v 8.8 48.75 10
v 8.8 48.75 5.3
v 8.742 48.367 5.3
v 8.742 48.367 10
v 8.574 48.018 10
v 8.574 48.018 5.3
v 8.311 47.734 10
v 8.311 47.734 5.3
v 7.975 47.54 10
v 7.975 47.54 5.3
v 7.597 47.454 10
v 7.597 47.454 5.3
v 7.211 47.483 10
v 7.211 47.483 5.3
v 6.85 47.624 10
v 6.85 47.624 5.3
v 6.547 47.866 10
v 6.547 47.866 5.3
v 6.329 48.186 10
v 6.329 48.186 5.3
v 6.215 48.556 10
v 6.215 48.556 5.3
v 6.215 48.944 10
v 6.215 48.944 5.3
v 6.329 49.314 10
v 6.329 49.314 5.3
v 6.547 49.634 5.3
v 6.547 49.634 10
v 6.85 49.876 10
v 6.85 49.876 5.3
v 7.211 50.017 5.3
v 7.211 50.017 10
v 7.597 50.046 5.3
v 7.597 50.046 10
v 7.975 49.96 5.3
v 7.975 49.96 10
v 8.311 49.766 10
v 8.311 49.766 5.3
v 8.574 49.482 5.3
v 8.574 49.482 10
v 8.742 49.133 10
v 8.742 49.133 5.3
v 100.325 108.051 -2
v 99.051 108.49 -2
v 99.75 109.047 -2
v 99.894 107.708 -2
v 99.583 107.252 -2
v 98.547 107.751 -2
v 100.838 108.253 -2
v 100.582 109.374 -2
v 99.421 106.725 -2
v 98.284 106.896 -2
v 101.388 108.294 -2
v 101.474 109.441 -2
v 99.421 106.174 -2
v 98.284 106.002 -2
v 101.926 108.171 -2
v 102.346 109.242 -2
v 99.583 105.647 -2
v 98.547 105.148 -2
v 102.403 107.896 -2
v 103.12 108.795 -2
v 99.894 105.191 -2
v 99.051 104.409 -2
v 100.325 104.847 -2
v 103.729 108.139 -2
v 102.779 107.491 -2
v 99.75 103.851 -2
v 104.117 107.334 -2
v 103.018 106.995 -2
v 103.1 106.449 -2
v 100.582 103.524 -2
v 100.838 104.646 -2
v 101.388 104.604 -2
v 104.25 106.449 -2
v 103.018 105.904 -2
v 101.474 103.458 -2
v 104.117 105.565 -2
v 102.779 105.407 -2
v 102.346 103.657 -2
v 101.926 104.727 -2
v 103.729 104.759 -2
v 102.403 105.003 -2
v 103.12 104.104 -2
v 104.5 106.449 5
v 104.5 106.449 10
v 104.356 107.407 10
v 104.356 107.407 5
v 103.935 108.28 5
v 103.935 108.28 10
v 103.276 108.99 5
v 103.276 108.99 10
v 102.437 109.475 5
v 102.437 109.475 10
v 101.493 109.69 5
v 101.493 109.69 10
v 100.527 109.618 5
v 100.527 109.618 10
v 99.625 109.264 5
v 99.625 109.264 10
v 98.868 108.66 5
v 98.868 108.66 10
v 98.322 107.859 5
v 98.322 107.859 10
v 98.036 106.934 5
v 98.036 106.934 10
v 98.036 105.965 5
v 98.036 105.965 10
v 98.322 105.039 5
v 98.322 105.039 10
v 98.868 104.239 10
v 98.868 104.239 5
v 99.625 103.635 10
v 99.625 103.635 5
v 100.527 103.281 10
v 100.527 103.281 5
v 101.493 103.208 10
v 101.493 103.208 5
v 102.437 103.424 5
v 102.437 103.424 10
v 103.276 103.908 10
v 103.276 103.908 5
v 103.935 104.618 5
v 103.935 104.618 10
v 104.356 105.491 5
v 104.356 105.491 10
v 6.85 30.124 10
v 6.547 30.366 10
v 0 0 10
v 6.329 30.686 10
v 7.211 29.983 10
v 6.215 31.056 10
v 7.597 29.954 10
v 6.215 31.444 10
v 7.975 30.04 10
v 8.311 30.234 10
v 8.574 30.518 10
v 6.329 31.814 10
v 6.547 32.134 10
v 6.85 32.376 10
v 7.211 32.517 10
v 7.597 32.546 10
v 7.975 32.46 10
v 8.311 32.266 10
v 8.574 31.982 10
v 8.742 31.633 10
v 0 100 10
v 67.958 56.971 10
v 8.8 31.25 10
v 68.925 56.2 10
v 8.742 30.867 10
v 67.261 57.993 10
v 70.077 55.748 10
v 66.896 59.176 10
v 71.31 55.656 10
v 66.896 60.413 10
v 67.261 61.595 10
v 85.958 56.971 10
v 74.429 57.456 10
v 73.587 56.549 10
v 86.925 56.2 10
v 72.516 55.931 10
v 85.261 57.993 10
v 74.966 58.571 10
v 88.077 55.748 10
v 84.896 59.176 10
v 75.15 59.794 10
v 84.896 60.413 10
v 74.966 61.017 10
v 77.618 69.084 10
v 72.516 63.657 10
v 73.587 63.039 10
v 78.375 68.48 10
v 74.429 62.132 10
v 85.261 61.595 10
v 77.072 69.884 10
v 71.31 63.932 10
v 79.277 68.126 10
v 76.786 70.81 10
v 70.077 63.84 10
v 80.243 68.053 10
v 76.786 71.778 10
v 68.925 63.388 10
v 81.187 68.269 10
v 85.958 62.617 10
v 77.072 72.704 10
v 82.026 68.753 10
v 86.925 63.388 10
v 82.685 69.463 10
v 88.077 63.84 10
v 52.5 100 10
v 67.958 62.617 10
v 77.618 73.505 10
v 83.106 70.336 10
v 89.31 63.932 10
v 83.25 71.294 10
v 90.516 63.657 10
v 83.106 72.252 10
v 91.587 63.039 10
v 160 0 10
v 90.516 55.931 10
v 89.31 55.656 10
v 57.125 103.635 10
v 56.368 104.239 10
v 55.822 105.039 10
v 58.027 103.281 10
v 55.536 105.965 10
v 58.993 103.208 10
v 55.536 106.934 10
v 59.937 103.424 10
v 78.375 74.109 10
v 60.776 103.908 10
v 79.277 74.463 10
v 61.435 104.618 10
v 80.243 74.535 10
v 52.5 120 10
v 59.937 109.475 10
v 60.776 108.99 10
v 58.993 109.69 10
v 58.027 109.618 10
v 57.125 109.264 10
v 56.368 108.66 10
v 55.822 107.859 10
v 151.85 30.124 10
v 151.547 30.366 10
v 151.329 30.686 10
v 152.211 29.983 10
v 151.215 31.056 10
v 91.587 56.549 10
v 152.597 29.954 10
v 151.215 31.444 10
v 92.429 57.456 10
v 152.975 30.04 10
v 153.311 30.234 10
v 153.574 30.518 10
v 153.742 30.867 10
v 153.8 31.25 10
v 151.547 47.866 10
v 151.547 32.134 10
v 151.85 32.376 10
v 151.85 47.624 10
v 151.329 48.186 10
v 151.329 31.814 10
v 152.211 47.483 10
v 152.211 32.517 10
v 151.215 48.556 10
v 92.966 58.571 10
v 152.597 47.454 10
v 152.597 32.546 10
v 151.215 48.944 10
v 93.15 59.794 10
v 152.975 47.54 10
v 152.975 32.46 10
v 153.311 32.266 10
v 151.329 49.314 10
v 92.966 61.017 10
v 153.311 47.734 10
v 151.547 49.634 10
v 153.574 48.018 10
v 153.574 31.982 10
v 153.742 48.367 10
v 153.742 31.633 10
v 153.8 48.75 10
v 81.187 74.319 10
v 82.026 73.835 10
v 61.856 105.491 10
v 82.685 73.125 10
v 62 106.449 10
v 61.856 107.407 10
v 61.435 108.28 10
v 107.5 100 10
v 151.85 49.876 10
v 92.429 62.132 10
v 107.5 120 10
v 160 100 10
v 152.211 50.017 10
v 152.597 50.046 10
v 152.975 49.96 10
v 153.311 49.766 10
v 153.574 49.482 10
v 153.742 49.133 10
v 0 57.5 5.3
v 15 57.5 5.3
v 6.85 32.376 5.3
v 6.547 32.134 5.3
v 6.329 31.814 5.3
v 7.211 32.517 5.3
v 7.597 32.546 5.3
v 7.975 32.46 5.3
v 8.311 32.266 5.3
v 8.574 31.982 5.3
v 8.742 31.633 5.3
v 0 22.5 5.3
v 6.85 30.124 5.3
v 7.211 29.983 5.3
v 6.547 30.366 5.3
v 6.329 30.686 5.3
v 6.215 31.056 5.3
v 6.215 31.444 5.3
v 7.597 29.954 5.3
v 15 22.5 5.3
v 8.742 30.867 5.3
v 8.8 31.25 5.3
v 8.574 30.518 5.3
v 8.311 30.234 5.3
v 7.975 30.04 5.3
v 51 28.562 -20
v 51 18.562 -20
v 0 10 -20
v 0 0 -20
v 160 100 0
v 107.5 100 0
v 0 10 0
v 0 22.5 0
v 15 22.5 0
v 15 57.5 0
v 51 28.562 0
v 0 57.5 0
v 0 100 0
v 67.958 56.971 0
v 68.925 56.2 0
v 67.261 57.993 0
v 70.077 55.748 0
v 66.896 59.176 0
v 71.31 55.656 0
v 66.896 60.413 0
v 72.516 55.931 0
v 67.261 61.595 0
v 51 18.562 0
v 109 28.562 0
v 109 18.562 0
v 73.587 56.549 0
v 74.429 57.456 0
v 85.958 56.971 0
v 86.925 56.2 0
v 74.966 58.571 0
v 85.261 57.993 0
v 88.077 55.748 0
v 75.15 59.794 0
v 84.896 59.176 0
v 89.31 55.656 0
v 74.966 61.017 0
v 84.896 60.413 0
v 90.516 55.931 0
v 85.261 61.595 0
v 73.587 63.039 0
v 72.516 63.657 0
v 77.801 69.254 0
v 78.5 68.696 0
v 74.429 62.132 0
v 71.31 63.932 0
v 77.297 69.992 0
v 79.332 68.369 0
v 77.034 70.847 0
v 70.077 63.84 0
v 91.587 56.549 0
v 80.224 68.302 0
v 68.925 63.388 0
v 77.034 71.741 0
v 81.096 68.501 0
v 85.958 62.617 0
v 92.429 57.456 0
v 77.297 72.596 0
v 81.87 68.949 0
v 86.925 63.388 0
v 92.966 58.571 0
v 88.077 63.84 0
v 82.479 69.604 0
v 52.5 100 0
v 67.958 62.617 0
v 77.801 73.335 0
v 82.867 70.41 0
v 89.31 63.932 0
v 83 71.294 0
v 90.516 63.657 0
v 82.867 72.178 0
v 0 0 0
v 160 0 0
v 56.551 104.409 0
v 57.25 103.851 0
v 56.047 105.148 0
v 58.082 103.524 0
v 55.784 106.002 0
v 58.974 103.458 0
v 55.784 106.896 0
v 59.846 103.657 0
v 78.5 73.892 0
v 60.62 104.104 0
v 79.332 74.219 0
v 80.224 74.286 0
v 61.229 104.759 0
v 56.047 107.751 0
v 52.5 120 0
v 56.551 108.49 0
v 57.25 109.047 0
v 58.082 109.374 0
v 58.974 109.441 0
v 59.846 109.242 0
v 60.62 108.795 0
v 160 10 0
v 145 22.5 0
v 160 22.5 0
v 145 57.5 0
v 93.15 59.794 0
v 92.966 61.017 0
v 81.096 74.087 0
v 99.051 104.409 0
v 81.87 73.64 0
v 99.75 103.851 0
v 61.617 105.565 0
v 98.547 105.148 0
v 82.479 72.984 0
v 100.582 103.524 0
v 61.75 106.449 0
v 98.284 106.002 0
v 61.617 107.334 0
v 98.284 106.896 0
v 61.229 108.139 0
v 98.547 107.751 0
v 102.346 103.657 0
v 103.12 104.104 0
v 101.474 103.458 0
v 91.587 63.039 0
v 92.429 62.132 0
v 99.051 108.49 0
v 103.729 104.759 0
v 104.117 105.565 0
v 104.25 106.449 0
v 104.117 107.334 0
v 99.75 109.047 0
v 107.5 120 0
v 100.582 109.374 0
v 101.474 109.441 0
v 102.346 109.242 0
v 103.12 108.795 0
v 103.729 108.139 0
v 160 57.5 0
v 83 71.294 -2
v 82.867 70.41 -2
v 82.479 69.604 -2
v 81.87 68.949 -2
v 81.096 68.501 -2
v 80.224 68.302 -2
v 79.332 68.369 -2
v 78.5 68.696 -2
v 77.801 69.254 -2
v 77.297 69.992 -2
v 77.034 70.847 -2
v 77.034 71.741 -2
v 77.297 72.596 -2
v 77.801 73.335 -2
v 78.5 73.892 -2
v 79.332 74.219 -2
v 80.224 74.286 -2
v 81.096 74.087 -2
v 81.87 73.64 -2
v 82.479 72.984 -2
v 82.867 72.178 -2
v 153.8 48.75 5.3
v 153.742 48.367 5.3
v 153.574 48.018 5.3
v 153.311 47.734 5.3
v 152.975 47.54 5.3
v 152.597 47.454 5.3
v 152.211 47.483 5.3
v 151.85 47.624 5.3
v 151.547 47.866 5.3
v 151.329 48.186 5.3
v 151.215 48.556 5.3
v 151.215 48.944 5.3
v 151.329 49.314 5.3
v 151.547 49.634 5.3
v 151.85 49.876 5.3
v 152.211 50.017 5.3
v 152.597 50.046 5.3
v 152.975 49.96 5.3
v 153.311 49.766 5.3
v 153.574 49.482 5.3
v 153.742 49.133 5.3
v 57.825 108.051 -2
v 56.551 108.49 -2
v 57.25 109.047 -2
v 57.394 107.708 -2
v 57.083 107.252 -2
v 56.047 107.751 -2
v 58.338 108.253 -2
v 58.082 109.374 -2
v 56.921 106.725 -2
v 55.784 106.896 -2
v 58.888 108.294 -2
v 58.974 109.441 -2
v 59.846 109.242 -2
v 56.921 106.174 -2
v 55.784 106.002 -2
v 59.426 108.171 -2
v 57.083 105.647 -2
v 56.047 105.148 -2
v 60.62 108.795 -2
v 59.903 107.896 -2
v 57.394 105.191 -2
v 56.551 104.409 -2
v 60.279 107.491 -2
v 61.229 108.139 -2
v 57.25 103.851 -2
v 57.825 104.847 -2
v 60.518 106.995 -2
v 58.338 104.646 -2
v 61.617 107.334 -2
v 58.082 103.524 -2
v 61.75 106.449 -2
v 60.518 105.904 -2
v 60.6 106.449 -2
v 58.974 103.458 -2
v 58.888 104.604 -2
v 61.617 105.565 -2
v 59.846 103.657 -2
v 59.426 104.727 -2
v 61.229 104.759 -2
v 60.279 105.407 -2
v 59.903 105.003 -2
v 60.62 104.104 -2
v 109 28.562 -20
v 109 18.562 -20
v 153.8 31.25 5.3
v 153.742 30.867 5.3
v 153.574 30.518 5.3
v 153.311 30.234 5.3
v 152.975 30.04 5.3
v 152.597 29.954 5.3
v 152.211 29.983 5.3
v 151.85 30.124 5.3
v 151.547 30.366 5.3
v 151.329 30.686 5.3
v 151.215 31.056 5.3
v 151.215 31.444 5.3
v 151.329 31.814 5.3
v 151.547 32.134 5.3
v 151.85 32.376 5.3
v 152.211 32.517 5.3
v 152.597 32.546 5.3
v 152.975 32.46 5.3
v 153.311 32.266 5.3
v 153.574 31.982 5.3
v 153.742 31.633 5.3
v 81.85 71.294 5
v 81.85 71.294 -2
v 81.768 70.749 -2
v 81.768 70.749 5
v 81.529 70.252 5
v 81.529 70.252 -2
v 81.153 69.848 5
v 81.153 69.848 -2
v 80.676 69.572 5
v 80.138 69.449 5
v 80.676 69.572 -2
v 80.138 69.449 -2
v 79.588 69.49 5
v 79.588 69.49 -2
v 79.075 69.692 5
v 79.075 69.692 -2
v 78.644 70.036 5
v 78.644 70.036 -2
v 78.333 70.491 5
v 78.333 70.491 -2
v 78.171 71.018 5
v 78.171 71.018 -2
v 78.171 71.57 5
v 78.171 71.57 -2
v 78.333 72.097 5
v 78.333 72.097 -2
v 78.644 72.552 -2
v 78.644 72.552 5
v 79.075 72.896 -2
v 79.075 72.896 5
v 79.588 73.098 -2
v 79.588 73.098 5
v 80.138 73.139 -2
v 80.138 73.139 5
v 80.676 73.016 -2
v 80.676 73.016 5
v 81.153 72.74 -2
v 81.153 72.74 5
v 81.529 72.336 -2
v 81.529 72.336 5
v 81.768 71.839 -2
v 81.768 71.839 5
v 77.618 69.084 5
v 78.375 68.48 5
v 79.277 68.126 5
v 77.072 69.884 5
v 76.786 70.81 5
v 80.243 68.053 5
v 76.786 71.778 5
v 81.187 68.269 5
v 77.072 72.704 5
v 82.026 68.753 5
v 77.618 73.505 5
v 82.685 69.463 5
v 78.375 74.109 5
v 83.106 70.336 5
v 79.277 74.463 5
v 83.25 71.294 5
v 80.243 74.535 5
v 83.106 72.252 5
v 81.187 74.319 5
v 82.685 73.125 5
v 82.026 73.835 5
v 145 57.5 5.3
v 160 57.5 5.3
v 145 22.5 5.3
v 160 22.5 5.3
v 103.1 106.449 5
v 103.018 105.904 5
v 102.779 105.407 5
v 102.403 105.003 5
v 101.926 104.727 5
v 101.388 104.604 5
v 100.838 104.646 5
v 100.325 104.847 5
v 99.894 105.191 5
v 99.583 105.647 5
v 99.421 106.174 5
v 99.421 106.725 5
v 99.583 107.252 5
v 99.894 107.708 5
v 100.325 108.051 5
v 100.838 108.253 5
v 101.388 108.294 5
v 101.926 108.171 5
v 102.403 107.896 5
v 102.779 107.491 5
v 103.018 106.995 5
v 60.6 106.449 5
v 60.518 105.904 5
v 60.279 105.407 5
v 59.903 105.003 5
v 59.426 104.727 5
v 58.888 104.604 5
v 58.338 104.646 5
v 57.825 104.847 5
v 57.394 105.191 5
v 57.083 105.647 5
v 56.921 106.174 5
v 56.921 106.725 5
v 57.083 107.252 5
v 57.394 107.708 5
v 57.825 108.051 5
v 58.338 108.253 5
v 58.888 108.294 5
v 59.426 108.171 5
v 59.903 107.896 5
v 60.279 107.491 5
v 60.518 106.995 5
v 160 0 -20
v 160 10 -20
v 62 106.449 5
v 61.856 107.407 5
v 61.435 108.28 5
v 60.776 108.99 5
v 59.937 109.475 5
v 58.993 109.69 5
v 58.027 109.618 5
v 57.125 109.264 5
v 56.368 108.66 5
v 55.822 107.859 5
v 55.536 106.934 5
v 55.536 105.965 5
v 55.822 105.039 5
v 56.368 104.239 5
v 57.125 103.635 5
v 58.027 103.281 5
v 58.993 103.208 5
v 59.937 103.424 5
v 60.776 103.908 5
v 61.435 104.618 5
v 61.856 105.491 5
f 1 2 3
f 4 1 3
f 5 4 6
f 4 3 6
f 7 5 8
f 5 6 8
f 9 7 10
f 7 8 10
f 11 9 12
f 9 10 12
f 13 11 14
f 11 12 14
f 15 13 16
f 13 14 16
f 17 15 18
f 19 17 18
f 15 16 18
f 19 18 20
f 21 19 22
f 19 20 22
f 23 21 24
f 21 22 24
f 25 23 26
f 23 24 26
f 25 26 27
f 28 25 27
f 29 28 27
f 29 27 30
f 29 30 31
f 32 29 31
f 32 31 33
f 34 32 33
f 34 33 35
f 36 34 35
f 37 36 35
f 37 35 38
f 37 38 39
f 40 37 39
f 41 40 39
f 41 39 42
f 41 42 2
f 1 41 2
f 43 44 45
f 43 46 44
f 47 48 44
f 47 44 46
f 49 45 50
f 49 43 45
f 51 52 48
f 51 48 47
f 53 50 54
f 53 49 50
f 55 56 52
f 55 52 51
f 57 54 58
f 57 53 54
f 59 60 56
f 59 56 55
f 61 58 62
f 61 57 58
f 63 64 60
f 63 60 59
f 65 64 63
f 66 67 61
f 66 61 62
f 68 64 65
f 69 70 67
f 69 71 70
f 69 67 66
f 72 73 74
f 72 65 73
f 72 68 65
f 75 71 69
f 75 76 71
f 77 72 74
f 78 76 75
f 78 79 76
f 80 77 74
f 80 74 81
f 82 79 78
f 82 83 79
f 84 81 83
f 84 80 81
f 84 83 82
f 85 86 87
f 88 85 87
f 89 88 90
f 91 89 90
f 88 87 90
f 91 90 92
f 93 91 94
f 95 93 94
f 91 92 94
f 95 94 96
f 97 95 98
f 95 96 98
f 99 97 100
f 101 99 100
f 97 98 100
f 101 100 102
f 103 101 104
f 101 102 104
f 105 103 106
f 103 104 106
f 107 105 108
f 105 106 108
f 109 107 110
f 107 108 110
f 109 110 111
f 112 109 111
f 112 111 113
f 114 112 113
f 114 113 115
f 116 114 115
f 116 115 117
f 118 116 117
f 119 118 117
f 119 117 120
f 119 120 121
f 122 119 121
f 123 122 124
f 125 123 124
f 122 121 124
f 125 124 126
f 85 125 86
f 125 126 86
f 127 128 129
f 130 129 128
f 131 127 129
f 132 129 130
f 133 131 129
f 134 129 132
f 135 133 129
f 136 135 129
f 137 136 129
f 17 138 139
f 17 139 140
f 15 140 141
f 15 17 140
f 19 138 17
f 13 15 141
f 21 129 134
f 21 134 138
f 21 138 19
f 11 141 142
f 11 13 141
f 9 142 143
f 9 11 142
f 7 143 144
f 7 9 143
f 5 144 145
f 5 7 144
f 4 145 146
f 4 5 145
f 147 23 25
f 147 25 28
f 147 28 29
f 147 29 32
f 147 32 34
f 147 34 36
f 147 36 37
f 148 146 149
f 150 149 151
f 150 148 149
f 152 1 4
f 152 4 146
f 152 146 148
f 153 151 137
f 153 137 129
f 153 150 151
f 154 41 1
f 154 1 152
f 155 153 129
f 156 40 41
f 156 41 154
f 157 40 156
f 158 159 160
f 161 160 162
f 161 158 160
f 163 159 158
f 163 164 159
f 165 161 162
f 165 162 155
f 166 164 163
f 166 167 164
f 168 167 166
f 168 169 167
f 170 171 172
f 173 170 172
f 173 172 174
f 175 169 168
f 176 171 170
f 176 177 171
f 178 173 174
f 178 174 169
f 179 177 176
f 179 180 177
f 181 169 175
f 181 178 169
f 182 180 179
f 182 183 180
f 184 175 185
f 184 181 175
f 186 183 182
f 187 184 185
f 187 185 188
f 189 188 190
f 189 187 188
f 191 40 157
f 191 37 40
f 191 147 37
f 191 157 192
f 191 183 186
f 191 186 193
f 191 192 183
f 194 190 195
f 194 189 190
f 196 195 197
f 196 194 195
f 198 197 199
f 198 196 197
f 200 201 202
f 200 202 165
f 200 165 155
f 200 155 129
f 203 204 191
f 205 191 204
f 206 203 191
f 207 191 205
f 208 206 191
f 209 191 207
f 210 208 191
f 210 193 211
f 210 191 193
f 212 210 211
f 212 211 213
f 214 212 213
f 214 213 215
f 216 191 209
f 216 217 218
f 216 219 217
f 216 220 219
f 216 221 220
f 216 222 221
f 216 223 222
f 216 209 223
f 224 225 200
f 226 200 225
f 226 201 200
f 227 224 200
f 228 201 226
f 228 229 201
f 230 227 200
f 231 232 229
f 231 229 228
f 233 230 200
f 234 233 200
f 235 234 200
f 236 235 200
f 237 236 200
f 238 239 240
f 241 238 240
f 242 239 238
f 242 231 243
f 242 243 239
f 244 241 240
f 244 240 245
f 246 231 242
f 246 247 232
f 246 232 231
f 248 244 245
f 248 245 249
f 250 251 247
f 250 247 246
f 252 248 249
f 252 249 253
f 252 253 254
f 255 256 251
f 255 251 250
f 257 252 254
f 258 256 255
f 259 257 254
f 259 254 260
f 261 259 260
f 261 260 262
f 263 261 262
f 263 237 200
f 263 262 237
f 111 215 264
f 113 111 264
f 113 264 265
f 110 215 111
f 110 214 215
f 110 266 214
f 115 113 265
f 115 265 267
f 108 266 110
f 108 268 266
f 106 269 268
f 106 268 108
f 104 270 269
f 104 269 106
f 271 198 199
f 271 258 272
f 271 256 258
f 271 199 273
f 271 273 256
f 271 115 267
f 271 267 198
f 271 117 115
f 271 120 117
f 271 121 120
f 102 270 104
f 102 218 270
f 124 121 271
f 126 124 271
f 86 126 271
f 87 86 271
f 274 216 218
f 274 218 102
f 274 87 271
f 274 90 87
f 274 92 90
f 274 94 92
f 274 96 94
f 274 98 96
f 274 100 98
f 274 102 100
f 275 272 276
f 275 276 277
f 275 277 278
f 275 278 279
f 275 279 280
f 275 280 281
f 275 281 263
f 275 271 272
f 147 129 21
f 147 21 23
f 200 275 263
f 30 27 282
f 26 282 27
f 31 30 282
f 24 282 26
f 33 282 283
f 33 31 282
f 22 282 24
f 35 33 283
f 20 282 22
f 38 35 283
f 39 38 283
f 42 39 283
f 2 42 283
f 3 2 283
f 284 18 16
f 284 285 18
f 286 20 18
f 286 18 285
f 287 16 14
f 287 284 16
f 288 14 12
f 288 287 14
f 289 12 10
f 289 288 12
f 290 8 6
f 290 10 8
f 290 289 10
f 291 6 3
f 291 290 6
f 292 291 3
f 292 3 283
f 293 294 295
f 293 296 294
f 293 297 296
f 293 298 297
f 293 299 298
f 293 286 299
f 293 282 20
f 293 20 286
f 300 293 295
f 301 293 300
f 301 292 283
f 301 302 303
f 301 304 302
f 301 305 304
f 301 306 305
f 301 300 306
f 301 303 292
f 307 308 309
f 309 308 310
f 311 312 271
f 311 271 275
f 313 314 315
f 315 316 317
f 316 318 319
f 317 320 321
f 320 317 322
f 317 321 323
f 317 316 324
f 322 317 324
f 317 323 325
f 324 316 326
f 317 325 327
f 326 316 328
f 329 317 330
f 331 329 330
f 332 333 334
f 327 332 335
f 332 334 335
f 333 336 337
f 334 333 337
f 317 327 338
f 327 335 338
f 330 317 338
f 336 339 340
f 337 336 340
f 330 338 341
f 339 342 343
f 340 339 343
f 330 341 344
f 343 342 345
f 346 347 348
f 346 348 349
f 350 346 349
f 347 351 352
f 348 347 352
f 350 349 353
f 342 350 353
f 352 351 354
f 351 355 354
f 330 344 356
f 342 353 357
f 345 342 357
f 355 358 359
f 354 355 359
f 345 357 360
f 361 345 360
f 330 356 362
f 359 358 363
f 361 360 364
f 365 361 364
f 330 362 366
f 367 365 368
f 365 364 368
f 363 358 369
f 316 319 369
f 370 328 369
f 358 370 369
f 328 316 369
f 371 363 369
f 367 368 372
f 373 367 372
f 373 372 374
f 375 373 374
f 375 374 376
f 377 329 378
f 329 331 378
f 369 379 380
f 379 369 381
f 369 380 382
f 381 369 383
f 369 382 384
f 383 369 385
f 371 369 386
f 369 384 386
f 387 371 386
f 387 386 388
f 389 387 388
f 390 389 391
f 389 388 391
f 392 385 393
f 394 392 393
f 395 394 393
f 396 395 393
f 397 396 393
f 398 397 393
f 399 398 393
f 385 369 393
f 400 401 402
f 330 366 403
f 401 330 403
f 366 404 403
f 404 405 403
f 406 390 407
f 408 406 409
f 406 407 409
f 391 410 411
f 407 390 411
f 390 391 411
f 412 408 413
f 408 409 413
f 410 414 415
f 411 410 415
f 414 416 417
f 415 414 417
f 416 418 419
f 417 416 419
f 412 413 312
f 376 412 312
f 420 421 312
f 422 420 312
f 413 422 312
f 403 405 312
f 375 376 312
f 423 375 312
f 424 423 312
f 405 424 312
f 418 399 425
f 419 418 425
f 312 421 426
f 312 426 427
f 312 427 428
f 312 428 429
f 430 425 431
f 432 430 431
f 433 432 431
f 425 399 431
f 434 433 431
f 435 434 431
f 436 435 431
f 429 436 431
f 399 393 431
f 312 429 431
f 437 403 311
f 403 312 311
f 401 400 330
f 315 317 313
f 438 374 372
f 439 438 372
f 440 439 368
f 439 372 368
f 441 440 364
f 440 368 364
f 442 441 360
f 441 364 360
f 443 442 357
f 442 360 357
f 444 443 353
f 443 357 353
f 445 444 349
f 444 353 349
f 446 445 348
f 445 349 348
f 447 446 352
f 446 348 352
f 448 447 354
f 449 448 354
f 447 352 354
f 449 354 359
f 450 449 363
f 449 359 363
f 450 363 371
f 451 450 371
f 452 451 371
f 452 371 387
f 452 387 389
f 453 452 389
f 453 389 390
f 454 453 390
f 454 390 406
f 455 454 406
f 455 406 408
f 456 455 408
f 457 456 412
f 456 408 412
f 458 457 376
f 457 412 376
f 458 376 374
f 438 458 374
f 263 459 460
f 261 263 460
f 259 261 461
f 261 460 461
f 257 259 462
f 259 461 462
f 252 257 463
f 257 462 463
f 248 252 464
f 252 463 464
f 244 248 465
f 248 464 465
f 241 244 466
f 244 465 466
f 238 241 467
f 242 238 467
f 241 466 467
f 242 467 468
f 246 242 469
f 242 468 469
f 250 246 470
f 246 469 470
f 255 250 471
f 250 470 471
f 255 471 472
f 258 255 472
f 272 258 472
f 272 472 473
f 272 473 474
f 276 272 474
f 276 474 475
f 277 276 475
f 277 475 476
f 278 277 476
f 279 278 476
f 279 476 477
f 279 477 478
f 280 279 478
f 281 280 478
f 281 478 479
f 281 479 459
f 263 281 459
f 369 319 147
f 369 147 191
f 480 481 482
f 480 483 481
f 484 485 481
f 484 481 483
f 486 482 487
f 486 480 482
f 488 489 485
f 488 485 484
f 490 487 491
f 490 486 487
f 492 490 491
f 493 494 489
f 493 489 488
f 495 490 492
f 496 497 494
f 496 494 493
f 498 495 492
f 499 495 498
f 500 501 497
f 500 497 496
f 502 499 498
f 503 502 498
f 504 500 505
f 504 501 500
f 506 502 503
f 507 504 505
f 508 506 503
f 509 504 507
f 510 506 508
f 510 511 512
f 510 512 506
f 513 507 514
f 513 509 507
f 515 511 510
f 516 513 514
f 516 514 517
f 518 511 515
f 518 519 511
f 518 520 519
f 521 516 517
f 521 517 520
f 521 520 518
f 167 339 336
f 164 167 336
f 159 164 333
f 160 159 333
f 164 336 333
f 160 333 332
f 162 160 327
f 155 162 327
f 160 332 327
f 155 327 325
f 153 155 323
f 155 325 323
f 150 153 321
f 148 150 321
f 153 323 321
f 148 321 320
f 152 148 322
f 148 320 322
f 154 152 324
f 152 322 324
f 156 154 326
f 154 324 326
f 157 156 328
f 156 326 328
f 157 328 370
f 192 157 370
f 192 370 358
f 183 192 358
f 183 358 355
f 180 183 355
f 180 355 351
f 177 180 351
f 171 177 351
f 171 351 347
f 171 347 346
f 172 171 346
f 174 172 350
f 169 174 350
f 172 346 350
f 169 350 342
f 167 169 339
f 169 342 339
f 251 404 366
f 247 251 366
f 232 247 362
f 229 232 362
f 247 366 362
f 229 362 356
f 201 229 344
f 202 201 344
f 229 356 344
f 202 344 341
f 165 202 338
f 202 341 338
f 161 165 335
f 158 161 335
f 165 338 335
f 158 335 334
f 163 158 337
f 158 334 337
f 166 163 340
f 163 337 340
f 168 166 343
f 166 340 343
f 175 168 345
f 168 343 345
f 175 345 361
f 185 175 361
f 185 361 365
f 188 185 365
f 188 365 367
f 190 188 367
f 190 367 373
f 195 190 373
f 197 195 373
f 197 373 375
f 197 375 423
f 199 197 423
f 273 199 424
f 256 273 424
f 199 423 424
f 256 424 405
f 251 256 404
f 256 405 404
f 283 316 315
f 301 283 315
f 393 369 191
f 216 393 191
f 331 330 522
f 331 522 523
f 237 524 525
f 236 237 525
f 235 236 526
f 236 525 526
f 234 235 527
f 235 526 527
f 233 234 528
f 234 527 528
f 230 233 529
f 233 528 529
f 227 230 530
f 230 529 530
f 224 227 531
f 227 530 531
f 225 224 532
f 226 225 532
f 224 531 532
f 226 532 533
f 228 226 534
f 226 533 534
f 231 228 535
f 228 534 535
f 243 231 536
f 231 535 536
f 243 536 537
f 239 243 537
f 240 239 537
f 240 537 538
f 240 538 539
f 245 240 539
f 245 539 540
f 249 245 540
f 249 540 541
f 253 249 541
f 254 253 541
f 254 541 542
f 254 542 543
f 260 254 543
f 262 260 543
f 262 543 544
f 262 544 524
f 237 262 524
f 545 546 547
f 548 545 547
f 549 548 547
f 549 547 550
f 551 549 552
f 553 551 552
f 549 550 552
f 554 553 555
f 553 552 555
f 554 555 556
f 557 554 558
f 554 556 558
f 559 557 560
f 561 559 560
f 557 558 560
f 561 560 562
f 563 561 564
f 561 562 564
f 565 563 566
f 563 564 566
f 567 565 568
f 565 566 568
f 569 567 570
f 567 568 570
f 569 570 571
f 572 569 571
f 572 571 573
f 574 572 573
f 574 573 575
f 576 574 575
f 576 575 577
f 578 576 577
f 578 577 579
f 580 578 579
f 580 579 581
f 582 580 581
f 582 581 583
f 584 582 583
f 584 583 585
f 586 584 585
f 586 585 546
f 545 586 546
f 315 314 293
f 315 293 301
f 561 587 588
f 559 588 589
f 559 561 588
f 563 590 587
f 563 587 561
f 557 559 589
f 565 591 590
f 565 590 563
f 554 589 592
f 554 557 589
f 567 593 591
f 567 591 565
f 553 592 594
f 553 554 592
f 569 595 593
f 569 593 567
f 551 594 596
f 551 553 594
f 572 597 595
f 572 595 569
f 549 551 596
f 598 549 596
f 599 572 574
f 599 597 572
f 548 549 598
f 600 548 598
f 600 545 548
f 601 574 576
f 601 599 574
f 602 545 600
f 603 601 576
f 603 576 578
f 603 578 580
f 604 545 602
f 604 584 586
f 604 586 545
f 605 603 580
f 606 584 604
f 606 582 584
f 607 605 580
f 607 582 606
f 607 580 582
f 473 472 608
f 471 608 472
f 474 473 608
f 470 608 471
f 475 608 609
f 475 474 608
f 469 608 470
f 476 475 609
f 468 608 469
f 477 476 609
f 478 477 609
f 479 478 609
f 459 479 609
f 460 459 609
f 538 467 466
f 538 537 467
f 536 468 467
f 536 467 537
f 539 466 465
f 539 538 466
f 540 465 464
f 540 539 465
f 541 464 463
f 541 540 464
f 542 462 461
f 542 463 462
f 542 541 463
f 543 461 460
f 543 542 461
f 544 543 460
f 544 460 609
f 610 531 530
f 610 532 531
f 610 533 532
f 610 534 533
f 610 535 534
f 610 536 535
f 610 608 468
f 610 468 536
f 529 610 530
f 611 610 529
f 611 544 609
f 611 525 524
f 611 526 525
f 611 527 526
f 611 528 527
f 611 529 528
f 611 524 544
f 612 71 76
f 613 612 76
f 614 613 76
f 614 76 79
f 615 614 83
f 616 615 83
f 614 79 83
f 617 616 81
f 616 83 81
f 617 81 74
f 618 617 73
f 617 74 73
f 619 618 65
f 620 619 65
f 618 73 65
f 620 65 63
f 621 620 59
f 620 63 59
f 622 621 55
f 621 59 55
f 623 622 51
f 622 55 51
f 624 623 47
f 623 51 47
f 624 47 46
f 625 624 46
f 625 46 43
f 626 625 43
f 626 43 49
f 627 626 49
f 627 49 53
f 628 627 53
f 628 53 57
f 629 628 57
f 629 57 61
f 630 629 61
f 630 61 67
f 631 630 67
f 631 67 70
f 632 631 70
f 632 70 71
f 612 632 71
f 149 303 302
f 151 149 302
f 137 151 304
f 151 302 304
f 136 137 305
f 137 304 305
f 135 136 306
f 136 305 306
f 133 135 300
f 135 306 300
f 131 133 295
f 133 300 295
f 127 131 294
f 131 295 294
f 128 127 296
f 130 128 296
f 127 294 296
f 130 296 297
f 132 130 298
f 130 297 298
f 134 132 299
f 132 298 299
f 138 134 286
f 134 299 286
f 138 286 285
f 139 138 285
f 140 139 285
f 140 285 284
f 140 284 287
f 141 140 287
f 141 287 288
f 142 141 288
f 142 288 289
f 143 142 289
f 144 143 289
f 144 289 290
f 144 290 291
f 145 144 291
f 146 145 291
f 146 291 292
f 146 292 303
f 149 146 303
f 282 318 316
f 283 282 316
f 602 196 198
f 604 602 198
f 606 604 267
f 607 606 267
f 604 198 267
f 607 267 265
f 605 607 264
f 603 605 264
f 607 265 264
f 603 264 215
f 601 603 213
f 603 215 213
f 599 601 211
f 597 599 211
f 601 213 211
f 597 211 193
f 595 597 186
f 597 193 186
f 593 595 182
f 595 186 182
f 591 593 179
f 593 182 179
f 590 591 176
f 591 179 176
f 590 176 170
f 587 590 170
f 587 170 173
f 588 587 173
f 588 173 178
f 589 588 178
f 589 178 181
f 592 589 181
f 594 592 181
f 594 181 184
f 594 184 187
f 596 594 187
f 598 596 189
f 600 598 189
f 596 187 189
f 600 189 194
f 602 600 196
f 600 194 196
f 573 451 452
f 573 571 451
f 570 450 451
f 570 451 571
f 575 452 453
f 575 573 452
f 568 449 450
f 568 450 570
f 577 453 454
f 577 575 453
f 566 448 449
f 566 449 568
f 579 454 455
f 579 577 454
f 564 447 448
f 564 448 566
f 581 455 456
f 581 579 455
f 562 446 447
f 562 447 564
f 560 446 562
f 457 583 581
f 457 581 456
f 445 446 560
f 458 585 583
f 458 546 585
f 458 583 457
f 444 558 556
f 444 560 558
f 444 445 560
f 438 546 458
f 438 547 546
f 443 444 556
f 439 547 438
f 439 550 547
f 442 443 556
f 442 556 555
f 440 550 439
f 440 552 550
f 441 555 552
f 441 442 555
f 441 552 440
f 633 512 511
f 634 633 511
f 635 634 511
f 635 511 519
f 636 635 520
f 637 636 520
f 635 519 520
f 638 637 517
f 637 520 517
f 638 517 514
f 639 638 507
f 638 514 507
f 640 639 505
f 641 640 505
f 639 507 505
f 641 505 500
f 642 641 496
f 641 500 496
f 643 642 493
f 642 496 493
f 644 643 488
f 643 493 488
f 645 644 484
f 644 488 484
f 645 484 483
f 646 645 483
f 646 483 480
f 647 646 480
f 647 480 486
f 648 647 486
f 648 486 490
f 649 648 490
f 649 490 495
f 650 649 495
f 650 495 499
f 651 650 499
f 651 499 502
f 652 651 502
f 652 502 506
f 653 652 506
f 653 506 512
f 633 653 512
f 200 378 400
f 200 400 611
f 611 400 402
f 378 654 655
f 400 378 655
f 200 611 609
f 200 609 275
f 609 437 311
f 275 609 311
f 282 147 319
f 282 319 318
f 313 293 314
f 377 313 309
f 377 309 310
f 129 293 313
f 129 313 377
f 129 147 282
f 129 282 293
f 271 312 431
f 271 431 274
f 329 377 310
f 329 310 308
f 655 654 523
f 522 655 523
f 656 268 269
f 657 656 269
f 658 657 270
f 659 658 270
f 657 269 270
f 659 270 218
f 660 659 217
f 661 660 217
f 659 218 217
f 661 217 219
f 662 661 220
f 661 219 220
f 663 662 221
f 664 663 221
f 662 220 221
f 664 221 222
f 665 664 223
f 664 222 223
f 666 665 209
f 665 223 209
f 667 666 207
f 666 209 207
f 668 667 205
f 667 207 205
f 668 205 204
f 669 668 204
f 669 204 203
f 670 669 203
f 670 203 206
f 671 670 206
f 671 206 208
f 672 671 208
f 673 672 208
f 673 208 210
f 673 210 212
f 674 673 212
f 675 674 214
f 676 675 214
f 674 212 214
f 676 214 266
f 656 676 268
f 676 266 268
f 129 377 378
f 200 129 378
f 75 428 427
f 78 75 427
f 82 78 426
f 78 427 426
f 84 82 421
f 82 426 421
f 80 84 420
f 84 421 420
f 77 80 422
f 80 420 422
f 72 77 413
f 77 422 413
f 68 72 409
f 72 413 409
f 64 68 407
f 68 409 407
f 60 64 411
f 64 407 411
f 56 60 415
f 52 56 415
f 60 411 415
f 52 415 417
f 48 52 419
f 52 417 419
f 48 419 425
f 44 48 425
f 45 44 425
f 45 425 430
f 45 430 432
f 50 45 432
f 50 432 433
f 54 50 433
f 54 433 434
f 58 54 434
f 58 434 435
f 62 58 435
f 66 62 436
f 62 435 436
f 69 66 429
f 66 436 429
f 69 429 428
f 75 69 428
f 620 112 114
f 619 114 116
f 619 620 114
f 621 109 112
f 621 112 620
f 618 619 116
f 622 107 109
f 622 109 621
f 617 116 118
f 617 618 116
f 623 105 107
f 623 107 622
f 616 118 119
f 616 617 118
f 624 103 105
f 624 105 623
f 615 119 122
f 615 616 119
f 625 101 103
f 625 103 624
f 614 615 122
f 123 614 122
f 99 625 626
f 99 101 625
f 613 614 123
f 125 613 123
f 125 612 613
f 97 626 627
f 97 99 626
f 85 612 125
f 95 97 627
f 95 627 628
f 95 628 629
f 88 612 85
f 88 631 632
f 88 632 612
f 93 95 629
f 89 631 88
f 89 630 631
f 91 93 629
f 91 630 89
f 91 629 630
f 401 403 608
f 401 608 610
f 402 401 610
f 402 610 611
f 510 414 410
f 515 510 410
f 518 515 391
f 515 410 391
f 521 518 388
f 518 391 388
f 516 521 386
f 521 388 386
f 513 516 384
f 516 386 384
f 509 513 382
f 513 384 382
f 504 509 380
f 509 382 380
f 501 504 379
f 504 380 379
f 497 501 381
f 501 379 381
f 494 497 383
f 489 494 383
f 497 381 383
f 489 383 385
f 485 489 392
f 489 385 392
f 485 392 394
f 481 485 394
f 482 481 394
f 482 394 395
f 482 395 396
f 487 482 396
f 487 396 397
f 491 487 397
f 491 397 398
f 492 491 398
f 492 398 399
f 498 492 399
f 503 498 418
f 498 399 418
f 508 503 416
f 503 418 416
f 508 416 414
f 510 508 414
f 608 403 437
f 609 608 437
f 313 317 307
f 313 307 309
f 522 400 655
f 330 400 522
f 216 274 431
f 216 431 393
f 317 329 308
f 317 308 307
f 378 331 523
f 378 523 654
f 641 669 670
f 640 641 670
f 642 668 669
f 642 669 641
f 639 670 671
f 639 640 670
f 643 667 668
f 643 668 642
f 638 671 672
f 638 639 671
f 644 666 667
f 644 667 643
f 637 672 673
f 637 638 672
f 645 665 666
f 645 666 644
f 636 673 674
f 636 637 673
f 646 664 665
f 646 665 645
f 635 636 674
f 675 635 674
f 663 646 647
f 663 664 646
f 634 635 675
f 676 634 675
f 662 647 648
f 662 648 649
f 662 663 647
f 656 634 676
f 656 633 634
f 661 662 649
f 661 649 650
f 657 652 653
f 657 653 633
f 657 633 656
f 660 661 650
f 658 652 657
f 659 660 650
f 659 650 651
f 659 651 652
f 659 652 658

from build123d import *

# Parameters (mm, degrees)
SKETCH_W        = 160
SKETCH_H        = 100
PAD_DEPTH       = 10
PAD008_DEPTH    = 20
SKETCH029_R     = 4.15
POCKET017_DEPTH = 10
SKETCH031_W     = 55
SKETCH031_H     = 10
PAD010_DEPTH    = 20
SKETCH032_R     = 3
PAD011_DEPTH    = 2
SKETCH033_R     = 1.85
POCKET018_DEPTH = 12.001
SKETCH034_R     = 3.25
POCKET019_DEPTH = 5
SKETCH035_W     = 15
SKETCH035_H     = 35
POCKET020_DEPTH = 5.3
SKETCH036_R     = 1.3
POCKET021_DEPTH = 4.701


with BuildPart() as part:
    # Sketch → Pad (new body)
    with BuildSketch(Plane.XY):
        with Locations((80, 50)):
            Rectangle(SKETCH_W, SKETCH_H)
    extrude(amount=PAD_DEPTH)

    # Sketch001 (on Face5 of Pad) → Pad008 (join)
    with BuildSketch(Plane(origin=(0, 0, 0), x_dir=(1, 0, 0), z_dir=(0, 0, -1))):
        Polygon((0, -10), (0, 0), (51, -18.562482), (51, -28.562482), align=None)
        Polygon((160, 0), (160, -10), (109, -28.562482), (109, -18.562482), align=None)
    extrude(amount=PAD008_DEPTH)

    # Sketch029 (on Face2 of Pad008) → Pocket017 (cut)
    with BuildSketch(Plane(origin=(0, 0, 0), x_dir=(1, 0, 0), z_dir=(0, 0, -1))):
        with Locations((71, -59.794095)):
            Circle(SKETCH029_R)
        with Locations((89, -59.794095)):
            Circle(SKETCH029_R)
    extrude(amount=-POCKET017_DEPTH, mode=Mode.SUBTRACT)

    # Sketch031 (on Face6 of Pocket017) → Pad010 (join)
    with BuildSketch(Plane(origin=(0, 100, 0), x_dir=(-1, 0, 0), z_dir=(0, 1, 0))):
        with Locations((-80, 5)):
            Rectangle(SKETCH031_W, SKETCH031_H)
    extrude(amount=PAD010_DEPTH)

    # Sketch032 (on Face17 of Pad010) → Pad011 (join)
    with BuildSketch(Plane(origin=(0, 0, 0), x_dir=(1, 0, 0), z_dir=(0, 0, -1))):
        with Locations((80, -71.294095)):
            Circle(SKETCH032_R)
        with Locations((101.25, -106.449251)):
            Circle(SKETCH032_R)
        with Locations((58.75, -106.449251)):
            Circle(SKETCH032_R)
    extrude(amount=PAD011_DEPTH)

    # Sketch033 (on Face26 of Pad011) → Pocket018 (cut, through all)
    with BuildSketch(Plane(origin=(0, 0, -2), x_dir=(1, 0, 0), z_dir=(0, 0, -1))):
        with Locations((58.75, -106.449251)):
            Circle(SKETCH033_R)
        with Locations((101.25, -106.449251)):
            Circle(SKETCH033_R)
        with Locations((80, -71.294095)):
            Circle(SKETCH033_R)
    extrude(amount=-POCKET018_DEPTH, mode=Mode.SUBTRACT)

    # Sketch034 (on Face5 of Pocket018) → Pocket019 (cut)
    with BuildSketch(Plane.XY.offset(10)):
        with Locations((58.75, 106.449251)):
            Circle(SKETCH034_R)
        with Locations((101.25, 106.449251)):
            Circle(SKETCH034_R)
        with Locations((80, 71.294095)):
            Circle(SKETCH034_R)
    extrude(amount=-POCKET019_DEPTH, mode=Mode.SUBTRACT)

    # Sketch035 (on Face4 of Pocket019) → Pocket020 (cut)
    with BuildSketch(Plane(origin=(0, 0, 0), x_dir=(1, 0, 0), z_dir=(0, 0, -1))):
        with Locations((152.5, -40)):
            Rectangle(SKETCH035_W, SKETCH035_H)
        with Locations((7.5, -40)):
            Rectangle(SKETCH035_W, SKETCH035_H)
    extrude(amount=-POCKET020_DEPTH, mode=Mode.SUBTRACT)

    # Sketch036 (on Face15 of Pocket020) → Pocket021 (cut, through all)
    with BuildSketch(Plane(origin=(0, 0, 5.3), x_dir=(1, 0, 0), z_dir=(0, 0, -1))):
        with Locations((152.5, -31.25)):
            Circle(SKETCH036_R)
        with Locations((152.5, -48.75)):
            Circle(SKETCH036_R)
        with Locations((7.5, -31.25)):
            Circle(SKETCH036_R)
        with Locations((7.5, -48.75)):
            Circle(SKETCH036_R)
    extrude(amount=-POCKET021_DEPTH, mode=Mode.SUBTRACT)


solid = part.part
